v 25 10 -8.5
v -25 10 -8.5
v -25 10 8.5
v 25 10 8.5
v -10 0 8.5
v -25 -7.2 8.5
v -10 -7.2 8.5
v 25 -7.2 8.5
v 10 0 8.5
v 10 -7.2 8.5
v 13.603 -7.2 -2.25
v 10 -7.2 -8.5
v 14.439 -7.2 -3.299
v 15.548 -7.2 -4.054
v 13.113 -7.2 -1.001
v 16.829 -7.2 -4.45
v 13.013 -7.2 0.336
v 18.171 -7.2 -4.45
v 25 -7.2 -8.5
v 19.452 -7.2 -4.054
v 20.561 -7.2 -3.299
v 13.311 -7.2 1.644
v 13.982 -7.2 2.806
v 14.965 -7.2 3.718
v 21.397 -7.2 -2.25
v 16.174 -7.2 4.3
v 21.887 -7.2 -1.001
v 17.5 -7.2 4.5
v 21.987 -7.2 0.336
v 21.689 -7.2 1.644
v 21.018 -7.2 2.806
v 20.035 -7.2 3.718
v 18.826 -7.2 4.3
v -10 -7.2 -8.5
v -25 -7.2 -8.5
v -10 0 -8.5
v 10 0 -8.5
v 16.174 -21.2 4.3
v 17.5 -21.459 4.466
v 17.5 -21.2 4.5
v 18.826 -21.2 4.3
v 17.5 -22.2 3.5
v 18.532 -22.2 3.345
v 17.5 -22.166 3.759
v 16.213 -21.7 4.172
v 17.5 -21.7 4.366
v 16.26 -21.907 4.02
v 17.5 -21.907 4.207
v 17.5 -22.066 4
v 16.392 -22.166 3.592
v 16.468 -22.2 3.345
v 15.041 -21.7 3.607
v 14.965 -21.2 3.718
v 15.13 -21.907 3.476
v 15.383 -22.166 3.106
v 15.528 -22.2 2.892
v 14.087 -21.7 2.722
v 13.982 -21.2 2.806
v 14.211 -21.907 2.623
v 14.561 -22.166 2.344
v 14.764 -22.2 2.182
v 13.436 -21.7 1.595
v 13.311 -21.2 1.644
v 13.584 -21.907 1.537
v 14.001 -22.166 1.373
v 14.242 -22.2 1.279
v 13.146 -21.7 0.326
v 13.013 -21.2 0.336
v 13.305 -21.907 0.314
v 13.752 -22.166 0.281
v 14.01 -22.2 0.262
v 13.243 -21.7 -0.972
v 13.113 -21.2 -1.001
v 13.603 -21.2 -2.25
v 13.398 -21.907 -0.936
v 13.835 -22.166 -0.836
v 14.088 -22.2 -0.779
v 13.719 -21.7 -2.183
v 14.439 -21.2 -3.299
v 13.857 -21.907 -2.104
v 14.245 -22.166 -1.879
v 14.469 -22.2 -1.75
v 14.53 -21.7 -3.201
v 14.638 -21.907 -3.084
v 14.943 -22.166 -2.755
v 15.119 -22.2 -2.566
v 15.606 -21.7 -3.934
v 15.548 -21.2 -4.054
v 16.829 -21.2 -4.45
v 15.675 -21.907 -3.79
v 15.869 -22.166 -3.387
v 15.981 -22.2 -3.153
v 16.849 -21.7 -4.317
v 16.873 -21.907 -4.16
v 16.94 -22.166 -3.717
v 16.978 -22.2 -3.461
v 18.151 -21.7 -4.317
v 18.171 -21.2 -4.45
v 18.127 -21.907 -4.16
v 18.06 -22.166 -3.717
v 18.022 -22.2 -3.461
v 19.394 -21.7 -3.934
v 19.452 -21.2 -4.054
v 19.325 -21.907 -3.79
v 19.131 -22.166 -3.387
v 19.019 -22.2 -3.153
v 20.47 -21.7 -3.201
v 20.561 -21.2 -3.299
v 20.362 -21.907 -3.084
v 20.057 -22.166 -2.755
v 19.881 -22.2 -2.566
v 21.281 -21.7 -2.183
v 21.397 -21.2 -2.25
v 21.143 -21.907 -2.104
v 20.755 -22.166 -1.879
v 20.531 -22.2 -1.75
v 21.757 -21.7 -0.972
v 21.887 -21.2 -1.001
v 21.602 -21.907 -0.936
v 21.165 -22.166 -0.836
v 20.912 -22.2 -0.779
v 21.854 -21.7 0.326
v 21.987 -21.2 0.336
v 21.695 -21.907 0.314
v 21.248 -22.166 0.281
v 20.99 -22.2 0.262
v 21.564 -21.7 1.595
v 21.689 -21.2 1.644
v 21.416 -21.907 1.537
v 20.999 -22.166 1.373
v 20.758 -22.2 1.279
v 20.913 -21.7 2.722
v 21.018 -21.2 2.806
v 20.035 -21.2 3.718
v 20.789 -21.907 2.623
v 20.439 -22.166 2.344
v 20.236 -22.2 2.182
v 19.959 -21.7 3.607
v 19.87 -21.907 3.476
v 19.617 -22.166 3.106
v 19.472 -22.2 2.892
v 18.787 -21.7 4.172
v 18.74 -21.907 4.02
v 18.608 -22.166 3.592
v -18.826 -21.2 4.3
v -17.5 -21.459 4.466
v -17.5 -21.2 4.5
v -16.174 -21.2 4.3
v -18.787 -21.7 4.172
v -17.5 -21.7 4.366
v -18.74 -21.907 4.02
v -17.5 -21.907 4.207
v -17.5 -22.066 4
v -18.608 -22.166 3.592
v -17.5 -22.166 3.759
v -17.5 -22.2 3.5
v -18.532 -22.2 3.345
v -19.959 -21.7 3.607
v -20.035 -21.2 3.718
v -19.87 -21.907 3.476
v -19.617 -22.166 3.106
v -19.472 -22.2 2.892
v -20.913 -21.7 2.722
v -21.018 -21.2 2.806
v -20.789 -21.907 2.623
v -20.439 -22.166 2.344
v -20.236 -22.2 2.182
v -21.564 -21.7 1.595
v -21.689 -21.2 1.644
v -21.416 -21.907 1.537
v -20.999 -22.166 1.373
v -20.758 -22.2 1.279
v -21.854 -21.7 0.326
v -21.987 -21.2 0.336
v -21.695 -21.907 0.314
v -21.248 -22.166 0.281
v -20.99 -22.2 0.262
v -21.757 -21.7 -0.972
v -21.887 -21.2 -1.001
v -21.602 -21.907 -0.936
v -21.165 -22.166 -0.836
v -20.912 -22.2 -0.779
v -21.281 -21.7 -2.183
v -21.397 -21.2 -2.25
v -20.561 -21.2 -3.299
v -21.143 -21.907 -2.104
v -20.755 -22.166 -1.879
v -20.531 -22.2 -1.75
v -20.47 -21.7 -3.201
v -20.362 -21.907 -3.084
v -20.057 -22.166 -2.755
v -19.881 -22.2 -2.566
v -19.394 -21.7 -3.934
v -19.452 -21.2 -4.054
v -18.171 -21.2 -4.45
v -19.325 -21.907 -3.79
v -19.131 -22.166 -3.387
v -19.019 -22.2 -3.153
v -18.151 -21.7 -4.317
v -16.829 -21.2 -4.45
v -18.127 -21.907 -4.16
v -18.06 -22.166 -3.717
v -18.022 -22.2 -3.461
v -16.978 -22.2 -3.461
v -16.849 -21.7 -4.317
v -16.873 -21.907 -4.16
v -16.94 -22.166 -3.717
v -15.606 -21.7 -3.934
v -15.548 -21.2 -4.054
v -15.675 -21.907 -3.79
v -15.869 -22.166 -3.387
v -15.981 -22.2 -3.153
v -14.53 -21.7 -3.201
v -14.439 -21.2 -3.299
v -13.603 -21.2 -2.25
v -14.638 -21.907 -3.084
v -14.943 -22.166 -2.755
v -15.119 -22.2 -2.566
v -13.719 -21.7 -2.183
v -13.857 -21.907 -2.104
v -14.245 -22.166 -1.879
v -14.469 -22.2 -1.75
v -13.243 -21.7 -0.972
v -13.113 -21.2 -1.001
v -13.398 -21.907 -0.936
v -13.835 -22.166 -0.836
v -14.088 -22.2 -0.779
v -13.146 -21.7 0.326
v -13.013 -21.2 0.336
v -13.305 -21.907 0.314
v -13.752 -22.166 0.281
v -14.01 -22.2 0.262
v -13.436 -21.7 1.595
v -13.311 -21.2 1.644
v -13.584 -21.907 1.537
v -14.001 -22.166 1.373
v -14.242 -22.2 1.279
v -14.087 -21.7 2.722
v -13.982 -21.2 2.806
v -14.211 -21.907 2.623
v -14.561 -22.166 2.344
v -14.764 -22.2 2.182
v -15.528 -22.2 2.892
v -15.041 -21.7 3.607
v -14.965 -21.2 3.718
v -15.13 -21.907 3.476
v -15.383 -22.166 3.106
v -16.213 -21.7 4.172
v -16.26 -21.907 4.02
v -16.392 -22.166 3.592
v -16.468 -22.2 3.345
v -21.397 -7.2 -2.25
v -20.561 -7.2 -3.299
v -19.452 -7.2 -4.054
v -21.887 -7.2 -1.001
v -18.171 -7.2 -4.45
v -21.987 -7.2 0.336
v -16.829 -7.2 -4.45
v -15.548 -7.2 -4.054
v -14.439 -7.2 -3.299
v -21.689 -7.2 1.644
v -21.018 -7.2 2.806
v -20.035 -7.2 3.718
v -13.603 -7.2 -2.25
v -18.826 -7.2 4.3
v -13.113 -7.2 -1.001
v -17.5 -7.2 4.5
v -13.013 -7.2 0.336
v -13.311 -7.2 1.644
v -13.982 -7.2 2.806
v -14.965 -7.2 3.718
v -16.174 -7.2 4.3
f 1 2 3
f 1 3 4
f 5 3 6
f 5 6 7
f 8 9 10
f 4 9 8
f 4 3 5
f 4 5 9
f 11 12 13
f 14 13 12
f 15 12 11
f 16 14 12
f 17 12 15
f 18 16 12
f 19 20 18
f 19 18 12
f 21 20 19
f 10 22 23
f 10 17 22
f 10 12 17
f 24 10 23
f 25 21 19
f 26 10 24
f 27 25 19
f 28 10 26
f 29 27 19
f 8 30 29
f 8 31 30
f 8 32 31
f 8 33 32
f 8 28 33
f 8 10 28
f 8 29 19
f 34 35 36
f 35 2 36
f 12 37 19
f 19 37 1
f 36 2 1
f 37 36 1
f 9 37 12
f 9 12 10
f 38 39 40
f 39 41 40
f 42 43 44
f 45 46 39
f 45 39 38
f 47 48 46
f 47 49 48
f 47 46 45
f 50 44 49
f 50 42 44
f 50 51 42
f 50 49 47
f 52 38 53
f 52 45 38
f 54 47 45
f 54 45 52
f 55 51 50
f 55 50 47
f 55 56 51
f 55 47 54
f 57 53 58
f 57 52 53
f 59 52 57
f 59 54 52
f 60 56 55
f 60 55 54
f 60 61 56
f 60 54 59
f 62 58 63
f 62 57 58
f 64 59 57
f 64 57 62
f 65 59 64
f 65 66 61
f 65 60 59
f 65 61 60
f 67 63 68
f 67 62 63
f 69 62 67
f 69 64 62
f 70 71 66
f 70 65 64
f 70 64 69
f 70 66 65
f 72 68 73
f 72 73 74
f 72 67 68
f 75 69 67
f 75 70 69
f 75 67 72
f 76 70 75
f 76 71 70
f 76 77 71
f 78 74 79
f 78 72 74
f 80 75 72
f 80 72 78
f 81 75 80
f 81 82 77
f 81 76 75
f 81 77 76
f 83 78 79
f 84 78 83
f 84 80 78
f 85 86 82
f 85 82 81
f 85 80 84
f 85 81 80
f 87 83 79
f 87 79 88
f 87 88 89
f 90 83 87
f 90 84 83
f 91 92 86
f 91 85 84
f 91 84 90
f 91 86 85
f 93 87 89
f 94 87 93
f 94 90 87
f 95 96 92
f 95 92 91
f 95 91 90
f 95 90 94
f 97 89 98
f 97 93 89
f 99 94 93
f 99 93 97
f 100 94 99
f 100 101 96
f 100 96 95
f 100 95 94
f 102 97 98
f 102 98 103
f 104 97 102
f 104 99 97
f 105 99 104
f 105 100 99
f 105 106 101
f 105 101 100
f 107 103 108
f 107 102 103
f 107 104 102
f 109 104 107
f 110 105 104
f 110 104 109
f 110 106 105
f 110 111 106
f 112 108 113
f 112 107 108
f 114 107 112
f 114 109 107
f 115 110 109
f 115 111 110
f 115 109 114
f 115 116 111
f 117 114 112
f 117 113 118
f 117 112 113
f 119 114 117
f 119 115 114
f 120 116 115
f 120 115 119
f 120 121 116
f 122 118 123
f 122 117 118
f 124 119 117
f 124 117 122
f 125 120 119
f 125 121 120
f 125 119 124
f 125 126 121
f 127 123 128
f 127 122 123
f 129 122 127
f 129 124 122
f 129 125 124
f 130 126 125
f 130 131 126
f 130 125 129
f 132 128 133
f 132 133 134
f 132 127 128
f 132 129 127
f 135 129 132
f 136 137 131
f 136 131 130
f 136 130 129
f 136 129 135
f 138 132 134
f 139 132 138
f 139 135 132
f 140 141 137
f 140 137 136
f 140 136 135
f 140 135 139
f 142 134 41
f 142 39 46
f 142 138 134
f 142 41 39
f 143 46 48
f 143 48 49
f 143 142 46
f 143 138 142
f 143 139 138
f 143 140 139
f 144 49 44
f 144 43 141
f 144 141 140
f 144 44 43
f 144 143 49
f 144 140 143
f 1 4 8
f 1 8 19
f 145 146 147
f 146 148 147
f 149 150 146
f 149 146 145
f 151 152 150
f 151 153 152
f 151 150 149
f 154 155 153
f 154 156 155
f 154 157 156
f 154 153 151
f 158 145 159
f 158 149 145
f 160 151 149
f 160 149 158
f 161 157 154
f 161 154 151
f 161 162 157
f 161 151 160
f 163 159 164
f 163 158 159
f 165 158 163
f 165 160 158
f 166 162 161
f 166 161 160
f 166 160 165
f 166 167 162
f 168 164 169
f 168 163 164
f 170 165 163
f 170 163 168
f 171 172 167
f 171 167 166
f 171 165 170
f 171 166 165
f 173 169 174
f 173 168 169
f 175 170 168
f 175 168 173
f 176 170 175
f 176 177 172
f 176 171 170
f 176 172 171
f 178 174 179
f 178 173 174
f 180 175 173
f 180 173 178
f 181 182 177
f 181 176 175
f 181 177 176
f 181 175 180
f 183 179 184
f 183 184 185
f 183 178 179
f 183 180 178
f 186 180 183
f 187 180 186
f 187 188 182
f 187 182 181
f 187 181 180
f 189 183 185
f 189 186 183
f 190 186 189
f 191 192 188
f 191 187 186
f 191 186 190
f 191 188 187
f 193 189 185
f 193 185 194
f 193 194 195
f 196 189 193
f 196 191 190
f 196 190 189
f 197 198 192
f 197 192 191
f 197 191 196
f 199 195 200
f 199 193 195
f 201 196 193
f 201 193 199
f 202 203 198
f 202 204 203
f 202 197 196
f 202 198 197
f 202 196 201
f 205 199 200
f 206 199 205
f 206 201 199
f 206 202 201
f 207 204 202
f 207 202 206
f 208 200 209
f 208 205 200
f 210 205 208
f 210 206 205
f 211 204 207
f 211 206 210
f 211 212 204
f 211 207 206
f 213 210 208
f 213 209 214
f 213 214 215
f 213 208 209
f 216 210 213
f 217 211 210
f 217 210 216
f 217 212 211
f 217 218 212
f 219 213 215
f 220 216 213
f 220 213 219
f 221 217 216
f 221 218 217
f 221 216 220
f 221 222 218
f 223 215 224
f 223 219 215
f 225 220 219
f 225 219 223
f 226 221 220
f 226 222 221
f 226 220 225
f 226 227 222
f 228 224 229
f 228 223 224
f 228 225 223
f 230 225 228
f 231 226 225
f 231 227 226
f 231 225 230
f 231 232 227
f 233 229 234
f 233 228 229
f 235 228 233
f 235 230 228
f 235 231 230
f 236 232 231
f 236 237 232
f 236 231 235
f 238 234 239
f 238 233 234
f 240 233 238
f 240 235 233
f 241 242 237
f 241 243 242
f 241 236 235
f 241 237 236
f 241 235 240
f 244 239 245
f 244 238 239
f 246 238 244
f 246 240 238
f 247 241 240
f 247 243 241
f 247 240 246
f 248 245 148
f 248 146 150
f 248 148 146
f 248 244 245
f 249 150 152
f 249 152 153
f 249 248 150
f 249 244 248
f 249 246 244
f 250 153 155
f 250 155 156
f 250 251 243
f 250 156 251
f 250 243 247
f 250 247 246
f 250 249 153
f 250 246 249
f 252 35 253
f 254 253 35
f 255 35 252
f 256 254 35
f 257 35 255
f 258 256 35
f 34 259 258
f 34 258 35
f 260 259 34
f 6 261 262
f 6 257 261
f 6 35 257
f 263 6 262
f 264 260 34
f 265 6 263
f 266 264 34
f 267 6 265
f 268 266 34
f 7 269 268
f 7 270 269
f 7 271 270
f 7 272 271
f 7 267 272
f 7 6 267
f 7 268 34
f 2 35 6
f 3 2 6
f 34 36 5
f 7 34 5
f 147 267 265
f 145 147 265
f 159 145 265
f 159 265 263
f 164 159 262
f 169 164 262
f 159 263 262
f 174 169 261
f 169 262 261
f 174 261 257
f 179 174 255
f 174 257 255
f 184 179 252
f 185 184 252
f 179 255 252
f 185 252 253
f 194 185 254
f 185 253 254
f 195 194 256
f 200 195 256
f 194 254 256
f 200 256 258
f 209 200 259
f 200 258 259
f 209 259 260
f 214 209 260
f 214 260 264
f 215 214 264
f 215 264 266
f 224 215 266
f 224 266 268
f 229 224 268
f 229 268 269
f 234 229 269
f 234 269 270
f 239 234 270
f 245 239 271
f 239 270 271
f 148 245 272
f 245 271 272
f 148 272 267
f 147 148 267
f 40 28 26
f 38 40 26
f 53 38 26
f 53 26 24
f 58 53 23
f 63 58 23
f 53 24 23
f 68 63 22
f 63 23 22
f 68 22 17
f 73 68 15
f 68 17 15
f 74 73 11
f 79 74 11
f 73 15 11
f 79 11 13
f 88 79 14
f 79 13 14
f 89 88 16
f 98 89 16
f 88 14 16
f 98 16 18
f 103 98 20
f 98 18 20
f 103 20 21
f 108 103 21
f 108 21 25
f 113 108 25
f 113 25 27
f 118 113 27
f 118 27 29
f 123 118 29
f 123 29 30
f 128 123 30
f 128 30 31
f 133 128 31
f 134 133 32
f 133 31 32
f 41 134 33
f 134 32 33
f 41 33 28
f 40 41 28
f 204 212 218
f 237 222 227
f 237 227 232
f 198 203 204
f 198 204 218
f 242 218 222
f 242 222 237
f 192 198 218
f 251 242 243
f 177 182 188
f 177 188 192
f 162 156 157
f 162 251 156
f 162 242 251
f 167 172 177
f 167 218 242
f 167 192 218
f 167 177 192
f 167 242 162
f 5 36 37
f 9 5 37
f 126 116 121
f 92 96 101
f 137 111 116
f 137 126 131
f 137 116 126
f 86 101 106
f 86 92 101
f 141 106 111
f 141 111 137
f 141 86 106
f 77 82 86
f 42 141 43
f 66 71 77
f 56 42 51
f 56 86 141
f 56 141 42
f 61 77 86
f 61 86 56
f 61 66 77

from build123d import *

# Parameters (mm, degrees)
SKETCH1_W           = 50
SKETCH1_H           = 17
BOSS_EXTRUDE1_DEPTH = 10
SKETCH2_W           = 15
SKETCH2_H           = 17
BOSS_EXTRUDE2_DEPTH = 7.2
SKETCH3_R           = 4.5
BOSS_EXTRUDE3_DEPTH = 15
FILLET1_R           = 1


with BuildPart() as part:
    # Sketch1 → Boss-Extrude1 (new body)
    with BuildSketch(Plane(origin=(0, 0, 0), x_dir=(1, 0, 0), z_dir=(0, 1, 0))):
        Rectangle(SKETCH1_W, SKETCH1_H)
    extrude(amount=BOSS_EXTRUDE1_DEPTH)

    # Sketch2 → Boss-Extrude2 (add)
    with BuildSketch(Plane.XZ):
        with Locations((-17.5, 0)):
            Rectangle(SKETCH2_W, SKETCH2_H)
        with Locations((17.5, 0)):
            Rectangle(SKETCH2_W, SKETCH2_H)
    extrude(amount=BOSS_EXTRUDE2_DEPTH)

    # Sketch3 → Boss-Extrude3 (add)
    with BuildSketch(Plane.XZ.offset(7.2)):
        with Locations(Location((-17.5, 0, 0), (0, 0, 90))):
            Circle(SKETCH3_R)
        with Locations(Location((17.5, 0, 0), (0, 0, 90))):
            Circle(SKETCH3_R)
    extrude(amount=BOSS_EXTRUDE3_DEPTH)

    # Fillet1
    fillet1_edges = [part.edges().sort_by_distance(p)[0] for p in [
        (-17.5, -22.2, -4.5),
        (17.5, -22.2, -4.5),
    ]]
    fillet(fillet1_edges, radius=FILLET1_R)


solid = part.part
